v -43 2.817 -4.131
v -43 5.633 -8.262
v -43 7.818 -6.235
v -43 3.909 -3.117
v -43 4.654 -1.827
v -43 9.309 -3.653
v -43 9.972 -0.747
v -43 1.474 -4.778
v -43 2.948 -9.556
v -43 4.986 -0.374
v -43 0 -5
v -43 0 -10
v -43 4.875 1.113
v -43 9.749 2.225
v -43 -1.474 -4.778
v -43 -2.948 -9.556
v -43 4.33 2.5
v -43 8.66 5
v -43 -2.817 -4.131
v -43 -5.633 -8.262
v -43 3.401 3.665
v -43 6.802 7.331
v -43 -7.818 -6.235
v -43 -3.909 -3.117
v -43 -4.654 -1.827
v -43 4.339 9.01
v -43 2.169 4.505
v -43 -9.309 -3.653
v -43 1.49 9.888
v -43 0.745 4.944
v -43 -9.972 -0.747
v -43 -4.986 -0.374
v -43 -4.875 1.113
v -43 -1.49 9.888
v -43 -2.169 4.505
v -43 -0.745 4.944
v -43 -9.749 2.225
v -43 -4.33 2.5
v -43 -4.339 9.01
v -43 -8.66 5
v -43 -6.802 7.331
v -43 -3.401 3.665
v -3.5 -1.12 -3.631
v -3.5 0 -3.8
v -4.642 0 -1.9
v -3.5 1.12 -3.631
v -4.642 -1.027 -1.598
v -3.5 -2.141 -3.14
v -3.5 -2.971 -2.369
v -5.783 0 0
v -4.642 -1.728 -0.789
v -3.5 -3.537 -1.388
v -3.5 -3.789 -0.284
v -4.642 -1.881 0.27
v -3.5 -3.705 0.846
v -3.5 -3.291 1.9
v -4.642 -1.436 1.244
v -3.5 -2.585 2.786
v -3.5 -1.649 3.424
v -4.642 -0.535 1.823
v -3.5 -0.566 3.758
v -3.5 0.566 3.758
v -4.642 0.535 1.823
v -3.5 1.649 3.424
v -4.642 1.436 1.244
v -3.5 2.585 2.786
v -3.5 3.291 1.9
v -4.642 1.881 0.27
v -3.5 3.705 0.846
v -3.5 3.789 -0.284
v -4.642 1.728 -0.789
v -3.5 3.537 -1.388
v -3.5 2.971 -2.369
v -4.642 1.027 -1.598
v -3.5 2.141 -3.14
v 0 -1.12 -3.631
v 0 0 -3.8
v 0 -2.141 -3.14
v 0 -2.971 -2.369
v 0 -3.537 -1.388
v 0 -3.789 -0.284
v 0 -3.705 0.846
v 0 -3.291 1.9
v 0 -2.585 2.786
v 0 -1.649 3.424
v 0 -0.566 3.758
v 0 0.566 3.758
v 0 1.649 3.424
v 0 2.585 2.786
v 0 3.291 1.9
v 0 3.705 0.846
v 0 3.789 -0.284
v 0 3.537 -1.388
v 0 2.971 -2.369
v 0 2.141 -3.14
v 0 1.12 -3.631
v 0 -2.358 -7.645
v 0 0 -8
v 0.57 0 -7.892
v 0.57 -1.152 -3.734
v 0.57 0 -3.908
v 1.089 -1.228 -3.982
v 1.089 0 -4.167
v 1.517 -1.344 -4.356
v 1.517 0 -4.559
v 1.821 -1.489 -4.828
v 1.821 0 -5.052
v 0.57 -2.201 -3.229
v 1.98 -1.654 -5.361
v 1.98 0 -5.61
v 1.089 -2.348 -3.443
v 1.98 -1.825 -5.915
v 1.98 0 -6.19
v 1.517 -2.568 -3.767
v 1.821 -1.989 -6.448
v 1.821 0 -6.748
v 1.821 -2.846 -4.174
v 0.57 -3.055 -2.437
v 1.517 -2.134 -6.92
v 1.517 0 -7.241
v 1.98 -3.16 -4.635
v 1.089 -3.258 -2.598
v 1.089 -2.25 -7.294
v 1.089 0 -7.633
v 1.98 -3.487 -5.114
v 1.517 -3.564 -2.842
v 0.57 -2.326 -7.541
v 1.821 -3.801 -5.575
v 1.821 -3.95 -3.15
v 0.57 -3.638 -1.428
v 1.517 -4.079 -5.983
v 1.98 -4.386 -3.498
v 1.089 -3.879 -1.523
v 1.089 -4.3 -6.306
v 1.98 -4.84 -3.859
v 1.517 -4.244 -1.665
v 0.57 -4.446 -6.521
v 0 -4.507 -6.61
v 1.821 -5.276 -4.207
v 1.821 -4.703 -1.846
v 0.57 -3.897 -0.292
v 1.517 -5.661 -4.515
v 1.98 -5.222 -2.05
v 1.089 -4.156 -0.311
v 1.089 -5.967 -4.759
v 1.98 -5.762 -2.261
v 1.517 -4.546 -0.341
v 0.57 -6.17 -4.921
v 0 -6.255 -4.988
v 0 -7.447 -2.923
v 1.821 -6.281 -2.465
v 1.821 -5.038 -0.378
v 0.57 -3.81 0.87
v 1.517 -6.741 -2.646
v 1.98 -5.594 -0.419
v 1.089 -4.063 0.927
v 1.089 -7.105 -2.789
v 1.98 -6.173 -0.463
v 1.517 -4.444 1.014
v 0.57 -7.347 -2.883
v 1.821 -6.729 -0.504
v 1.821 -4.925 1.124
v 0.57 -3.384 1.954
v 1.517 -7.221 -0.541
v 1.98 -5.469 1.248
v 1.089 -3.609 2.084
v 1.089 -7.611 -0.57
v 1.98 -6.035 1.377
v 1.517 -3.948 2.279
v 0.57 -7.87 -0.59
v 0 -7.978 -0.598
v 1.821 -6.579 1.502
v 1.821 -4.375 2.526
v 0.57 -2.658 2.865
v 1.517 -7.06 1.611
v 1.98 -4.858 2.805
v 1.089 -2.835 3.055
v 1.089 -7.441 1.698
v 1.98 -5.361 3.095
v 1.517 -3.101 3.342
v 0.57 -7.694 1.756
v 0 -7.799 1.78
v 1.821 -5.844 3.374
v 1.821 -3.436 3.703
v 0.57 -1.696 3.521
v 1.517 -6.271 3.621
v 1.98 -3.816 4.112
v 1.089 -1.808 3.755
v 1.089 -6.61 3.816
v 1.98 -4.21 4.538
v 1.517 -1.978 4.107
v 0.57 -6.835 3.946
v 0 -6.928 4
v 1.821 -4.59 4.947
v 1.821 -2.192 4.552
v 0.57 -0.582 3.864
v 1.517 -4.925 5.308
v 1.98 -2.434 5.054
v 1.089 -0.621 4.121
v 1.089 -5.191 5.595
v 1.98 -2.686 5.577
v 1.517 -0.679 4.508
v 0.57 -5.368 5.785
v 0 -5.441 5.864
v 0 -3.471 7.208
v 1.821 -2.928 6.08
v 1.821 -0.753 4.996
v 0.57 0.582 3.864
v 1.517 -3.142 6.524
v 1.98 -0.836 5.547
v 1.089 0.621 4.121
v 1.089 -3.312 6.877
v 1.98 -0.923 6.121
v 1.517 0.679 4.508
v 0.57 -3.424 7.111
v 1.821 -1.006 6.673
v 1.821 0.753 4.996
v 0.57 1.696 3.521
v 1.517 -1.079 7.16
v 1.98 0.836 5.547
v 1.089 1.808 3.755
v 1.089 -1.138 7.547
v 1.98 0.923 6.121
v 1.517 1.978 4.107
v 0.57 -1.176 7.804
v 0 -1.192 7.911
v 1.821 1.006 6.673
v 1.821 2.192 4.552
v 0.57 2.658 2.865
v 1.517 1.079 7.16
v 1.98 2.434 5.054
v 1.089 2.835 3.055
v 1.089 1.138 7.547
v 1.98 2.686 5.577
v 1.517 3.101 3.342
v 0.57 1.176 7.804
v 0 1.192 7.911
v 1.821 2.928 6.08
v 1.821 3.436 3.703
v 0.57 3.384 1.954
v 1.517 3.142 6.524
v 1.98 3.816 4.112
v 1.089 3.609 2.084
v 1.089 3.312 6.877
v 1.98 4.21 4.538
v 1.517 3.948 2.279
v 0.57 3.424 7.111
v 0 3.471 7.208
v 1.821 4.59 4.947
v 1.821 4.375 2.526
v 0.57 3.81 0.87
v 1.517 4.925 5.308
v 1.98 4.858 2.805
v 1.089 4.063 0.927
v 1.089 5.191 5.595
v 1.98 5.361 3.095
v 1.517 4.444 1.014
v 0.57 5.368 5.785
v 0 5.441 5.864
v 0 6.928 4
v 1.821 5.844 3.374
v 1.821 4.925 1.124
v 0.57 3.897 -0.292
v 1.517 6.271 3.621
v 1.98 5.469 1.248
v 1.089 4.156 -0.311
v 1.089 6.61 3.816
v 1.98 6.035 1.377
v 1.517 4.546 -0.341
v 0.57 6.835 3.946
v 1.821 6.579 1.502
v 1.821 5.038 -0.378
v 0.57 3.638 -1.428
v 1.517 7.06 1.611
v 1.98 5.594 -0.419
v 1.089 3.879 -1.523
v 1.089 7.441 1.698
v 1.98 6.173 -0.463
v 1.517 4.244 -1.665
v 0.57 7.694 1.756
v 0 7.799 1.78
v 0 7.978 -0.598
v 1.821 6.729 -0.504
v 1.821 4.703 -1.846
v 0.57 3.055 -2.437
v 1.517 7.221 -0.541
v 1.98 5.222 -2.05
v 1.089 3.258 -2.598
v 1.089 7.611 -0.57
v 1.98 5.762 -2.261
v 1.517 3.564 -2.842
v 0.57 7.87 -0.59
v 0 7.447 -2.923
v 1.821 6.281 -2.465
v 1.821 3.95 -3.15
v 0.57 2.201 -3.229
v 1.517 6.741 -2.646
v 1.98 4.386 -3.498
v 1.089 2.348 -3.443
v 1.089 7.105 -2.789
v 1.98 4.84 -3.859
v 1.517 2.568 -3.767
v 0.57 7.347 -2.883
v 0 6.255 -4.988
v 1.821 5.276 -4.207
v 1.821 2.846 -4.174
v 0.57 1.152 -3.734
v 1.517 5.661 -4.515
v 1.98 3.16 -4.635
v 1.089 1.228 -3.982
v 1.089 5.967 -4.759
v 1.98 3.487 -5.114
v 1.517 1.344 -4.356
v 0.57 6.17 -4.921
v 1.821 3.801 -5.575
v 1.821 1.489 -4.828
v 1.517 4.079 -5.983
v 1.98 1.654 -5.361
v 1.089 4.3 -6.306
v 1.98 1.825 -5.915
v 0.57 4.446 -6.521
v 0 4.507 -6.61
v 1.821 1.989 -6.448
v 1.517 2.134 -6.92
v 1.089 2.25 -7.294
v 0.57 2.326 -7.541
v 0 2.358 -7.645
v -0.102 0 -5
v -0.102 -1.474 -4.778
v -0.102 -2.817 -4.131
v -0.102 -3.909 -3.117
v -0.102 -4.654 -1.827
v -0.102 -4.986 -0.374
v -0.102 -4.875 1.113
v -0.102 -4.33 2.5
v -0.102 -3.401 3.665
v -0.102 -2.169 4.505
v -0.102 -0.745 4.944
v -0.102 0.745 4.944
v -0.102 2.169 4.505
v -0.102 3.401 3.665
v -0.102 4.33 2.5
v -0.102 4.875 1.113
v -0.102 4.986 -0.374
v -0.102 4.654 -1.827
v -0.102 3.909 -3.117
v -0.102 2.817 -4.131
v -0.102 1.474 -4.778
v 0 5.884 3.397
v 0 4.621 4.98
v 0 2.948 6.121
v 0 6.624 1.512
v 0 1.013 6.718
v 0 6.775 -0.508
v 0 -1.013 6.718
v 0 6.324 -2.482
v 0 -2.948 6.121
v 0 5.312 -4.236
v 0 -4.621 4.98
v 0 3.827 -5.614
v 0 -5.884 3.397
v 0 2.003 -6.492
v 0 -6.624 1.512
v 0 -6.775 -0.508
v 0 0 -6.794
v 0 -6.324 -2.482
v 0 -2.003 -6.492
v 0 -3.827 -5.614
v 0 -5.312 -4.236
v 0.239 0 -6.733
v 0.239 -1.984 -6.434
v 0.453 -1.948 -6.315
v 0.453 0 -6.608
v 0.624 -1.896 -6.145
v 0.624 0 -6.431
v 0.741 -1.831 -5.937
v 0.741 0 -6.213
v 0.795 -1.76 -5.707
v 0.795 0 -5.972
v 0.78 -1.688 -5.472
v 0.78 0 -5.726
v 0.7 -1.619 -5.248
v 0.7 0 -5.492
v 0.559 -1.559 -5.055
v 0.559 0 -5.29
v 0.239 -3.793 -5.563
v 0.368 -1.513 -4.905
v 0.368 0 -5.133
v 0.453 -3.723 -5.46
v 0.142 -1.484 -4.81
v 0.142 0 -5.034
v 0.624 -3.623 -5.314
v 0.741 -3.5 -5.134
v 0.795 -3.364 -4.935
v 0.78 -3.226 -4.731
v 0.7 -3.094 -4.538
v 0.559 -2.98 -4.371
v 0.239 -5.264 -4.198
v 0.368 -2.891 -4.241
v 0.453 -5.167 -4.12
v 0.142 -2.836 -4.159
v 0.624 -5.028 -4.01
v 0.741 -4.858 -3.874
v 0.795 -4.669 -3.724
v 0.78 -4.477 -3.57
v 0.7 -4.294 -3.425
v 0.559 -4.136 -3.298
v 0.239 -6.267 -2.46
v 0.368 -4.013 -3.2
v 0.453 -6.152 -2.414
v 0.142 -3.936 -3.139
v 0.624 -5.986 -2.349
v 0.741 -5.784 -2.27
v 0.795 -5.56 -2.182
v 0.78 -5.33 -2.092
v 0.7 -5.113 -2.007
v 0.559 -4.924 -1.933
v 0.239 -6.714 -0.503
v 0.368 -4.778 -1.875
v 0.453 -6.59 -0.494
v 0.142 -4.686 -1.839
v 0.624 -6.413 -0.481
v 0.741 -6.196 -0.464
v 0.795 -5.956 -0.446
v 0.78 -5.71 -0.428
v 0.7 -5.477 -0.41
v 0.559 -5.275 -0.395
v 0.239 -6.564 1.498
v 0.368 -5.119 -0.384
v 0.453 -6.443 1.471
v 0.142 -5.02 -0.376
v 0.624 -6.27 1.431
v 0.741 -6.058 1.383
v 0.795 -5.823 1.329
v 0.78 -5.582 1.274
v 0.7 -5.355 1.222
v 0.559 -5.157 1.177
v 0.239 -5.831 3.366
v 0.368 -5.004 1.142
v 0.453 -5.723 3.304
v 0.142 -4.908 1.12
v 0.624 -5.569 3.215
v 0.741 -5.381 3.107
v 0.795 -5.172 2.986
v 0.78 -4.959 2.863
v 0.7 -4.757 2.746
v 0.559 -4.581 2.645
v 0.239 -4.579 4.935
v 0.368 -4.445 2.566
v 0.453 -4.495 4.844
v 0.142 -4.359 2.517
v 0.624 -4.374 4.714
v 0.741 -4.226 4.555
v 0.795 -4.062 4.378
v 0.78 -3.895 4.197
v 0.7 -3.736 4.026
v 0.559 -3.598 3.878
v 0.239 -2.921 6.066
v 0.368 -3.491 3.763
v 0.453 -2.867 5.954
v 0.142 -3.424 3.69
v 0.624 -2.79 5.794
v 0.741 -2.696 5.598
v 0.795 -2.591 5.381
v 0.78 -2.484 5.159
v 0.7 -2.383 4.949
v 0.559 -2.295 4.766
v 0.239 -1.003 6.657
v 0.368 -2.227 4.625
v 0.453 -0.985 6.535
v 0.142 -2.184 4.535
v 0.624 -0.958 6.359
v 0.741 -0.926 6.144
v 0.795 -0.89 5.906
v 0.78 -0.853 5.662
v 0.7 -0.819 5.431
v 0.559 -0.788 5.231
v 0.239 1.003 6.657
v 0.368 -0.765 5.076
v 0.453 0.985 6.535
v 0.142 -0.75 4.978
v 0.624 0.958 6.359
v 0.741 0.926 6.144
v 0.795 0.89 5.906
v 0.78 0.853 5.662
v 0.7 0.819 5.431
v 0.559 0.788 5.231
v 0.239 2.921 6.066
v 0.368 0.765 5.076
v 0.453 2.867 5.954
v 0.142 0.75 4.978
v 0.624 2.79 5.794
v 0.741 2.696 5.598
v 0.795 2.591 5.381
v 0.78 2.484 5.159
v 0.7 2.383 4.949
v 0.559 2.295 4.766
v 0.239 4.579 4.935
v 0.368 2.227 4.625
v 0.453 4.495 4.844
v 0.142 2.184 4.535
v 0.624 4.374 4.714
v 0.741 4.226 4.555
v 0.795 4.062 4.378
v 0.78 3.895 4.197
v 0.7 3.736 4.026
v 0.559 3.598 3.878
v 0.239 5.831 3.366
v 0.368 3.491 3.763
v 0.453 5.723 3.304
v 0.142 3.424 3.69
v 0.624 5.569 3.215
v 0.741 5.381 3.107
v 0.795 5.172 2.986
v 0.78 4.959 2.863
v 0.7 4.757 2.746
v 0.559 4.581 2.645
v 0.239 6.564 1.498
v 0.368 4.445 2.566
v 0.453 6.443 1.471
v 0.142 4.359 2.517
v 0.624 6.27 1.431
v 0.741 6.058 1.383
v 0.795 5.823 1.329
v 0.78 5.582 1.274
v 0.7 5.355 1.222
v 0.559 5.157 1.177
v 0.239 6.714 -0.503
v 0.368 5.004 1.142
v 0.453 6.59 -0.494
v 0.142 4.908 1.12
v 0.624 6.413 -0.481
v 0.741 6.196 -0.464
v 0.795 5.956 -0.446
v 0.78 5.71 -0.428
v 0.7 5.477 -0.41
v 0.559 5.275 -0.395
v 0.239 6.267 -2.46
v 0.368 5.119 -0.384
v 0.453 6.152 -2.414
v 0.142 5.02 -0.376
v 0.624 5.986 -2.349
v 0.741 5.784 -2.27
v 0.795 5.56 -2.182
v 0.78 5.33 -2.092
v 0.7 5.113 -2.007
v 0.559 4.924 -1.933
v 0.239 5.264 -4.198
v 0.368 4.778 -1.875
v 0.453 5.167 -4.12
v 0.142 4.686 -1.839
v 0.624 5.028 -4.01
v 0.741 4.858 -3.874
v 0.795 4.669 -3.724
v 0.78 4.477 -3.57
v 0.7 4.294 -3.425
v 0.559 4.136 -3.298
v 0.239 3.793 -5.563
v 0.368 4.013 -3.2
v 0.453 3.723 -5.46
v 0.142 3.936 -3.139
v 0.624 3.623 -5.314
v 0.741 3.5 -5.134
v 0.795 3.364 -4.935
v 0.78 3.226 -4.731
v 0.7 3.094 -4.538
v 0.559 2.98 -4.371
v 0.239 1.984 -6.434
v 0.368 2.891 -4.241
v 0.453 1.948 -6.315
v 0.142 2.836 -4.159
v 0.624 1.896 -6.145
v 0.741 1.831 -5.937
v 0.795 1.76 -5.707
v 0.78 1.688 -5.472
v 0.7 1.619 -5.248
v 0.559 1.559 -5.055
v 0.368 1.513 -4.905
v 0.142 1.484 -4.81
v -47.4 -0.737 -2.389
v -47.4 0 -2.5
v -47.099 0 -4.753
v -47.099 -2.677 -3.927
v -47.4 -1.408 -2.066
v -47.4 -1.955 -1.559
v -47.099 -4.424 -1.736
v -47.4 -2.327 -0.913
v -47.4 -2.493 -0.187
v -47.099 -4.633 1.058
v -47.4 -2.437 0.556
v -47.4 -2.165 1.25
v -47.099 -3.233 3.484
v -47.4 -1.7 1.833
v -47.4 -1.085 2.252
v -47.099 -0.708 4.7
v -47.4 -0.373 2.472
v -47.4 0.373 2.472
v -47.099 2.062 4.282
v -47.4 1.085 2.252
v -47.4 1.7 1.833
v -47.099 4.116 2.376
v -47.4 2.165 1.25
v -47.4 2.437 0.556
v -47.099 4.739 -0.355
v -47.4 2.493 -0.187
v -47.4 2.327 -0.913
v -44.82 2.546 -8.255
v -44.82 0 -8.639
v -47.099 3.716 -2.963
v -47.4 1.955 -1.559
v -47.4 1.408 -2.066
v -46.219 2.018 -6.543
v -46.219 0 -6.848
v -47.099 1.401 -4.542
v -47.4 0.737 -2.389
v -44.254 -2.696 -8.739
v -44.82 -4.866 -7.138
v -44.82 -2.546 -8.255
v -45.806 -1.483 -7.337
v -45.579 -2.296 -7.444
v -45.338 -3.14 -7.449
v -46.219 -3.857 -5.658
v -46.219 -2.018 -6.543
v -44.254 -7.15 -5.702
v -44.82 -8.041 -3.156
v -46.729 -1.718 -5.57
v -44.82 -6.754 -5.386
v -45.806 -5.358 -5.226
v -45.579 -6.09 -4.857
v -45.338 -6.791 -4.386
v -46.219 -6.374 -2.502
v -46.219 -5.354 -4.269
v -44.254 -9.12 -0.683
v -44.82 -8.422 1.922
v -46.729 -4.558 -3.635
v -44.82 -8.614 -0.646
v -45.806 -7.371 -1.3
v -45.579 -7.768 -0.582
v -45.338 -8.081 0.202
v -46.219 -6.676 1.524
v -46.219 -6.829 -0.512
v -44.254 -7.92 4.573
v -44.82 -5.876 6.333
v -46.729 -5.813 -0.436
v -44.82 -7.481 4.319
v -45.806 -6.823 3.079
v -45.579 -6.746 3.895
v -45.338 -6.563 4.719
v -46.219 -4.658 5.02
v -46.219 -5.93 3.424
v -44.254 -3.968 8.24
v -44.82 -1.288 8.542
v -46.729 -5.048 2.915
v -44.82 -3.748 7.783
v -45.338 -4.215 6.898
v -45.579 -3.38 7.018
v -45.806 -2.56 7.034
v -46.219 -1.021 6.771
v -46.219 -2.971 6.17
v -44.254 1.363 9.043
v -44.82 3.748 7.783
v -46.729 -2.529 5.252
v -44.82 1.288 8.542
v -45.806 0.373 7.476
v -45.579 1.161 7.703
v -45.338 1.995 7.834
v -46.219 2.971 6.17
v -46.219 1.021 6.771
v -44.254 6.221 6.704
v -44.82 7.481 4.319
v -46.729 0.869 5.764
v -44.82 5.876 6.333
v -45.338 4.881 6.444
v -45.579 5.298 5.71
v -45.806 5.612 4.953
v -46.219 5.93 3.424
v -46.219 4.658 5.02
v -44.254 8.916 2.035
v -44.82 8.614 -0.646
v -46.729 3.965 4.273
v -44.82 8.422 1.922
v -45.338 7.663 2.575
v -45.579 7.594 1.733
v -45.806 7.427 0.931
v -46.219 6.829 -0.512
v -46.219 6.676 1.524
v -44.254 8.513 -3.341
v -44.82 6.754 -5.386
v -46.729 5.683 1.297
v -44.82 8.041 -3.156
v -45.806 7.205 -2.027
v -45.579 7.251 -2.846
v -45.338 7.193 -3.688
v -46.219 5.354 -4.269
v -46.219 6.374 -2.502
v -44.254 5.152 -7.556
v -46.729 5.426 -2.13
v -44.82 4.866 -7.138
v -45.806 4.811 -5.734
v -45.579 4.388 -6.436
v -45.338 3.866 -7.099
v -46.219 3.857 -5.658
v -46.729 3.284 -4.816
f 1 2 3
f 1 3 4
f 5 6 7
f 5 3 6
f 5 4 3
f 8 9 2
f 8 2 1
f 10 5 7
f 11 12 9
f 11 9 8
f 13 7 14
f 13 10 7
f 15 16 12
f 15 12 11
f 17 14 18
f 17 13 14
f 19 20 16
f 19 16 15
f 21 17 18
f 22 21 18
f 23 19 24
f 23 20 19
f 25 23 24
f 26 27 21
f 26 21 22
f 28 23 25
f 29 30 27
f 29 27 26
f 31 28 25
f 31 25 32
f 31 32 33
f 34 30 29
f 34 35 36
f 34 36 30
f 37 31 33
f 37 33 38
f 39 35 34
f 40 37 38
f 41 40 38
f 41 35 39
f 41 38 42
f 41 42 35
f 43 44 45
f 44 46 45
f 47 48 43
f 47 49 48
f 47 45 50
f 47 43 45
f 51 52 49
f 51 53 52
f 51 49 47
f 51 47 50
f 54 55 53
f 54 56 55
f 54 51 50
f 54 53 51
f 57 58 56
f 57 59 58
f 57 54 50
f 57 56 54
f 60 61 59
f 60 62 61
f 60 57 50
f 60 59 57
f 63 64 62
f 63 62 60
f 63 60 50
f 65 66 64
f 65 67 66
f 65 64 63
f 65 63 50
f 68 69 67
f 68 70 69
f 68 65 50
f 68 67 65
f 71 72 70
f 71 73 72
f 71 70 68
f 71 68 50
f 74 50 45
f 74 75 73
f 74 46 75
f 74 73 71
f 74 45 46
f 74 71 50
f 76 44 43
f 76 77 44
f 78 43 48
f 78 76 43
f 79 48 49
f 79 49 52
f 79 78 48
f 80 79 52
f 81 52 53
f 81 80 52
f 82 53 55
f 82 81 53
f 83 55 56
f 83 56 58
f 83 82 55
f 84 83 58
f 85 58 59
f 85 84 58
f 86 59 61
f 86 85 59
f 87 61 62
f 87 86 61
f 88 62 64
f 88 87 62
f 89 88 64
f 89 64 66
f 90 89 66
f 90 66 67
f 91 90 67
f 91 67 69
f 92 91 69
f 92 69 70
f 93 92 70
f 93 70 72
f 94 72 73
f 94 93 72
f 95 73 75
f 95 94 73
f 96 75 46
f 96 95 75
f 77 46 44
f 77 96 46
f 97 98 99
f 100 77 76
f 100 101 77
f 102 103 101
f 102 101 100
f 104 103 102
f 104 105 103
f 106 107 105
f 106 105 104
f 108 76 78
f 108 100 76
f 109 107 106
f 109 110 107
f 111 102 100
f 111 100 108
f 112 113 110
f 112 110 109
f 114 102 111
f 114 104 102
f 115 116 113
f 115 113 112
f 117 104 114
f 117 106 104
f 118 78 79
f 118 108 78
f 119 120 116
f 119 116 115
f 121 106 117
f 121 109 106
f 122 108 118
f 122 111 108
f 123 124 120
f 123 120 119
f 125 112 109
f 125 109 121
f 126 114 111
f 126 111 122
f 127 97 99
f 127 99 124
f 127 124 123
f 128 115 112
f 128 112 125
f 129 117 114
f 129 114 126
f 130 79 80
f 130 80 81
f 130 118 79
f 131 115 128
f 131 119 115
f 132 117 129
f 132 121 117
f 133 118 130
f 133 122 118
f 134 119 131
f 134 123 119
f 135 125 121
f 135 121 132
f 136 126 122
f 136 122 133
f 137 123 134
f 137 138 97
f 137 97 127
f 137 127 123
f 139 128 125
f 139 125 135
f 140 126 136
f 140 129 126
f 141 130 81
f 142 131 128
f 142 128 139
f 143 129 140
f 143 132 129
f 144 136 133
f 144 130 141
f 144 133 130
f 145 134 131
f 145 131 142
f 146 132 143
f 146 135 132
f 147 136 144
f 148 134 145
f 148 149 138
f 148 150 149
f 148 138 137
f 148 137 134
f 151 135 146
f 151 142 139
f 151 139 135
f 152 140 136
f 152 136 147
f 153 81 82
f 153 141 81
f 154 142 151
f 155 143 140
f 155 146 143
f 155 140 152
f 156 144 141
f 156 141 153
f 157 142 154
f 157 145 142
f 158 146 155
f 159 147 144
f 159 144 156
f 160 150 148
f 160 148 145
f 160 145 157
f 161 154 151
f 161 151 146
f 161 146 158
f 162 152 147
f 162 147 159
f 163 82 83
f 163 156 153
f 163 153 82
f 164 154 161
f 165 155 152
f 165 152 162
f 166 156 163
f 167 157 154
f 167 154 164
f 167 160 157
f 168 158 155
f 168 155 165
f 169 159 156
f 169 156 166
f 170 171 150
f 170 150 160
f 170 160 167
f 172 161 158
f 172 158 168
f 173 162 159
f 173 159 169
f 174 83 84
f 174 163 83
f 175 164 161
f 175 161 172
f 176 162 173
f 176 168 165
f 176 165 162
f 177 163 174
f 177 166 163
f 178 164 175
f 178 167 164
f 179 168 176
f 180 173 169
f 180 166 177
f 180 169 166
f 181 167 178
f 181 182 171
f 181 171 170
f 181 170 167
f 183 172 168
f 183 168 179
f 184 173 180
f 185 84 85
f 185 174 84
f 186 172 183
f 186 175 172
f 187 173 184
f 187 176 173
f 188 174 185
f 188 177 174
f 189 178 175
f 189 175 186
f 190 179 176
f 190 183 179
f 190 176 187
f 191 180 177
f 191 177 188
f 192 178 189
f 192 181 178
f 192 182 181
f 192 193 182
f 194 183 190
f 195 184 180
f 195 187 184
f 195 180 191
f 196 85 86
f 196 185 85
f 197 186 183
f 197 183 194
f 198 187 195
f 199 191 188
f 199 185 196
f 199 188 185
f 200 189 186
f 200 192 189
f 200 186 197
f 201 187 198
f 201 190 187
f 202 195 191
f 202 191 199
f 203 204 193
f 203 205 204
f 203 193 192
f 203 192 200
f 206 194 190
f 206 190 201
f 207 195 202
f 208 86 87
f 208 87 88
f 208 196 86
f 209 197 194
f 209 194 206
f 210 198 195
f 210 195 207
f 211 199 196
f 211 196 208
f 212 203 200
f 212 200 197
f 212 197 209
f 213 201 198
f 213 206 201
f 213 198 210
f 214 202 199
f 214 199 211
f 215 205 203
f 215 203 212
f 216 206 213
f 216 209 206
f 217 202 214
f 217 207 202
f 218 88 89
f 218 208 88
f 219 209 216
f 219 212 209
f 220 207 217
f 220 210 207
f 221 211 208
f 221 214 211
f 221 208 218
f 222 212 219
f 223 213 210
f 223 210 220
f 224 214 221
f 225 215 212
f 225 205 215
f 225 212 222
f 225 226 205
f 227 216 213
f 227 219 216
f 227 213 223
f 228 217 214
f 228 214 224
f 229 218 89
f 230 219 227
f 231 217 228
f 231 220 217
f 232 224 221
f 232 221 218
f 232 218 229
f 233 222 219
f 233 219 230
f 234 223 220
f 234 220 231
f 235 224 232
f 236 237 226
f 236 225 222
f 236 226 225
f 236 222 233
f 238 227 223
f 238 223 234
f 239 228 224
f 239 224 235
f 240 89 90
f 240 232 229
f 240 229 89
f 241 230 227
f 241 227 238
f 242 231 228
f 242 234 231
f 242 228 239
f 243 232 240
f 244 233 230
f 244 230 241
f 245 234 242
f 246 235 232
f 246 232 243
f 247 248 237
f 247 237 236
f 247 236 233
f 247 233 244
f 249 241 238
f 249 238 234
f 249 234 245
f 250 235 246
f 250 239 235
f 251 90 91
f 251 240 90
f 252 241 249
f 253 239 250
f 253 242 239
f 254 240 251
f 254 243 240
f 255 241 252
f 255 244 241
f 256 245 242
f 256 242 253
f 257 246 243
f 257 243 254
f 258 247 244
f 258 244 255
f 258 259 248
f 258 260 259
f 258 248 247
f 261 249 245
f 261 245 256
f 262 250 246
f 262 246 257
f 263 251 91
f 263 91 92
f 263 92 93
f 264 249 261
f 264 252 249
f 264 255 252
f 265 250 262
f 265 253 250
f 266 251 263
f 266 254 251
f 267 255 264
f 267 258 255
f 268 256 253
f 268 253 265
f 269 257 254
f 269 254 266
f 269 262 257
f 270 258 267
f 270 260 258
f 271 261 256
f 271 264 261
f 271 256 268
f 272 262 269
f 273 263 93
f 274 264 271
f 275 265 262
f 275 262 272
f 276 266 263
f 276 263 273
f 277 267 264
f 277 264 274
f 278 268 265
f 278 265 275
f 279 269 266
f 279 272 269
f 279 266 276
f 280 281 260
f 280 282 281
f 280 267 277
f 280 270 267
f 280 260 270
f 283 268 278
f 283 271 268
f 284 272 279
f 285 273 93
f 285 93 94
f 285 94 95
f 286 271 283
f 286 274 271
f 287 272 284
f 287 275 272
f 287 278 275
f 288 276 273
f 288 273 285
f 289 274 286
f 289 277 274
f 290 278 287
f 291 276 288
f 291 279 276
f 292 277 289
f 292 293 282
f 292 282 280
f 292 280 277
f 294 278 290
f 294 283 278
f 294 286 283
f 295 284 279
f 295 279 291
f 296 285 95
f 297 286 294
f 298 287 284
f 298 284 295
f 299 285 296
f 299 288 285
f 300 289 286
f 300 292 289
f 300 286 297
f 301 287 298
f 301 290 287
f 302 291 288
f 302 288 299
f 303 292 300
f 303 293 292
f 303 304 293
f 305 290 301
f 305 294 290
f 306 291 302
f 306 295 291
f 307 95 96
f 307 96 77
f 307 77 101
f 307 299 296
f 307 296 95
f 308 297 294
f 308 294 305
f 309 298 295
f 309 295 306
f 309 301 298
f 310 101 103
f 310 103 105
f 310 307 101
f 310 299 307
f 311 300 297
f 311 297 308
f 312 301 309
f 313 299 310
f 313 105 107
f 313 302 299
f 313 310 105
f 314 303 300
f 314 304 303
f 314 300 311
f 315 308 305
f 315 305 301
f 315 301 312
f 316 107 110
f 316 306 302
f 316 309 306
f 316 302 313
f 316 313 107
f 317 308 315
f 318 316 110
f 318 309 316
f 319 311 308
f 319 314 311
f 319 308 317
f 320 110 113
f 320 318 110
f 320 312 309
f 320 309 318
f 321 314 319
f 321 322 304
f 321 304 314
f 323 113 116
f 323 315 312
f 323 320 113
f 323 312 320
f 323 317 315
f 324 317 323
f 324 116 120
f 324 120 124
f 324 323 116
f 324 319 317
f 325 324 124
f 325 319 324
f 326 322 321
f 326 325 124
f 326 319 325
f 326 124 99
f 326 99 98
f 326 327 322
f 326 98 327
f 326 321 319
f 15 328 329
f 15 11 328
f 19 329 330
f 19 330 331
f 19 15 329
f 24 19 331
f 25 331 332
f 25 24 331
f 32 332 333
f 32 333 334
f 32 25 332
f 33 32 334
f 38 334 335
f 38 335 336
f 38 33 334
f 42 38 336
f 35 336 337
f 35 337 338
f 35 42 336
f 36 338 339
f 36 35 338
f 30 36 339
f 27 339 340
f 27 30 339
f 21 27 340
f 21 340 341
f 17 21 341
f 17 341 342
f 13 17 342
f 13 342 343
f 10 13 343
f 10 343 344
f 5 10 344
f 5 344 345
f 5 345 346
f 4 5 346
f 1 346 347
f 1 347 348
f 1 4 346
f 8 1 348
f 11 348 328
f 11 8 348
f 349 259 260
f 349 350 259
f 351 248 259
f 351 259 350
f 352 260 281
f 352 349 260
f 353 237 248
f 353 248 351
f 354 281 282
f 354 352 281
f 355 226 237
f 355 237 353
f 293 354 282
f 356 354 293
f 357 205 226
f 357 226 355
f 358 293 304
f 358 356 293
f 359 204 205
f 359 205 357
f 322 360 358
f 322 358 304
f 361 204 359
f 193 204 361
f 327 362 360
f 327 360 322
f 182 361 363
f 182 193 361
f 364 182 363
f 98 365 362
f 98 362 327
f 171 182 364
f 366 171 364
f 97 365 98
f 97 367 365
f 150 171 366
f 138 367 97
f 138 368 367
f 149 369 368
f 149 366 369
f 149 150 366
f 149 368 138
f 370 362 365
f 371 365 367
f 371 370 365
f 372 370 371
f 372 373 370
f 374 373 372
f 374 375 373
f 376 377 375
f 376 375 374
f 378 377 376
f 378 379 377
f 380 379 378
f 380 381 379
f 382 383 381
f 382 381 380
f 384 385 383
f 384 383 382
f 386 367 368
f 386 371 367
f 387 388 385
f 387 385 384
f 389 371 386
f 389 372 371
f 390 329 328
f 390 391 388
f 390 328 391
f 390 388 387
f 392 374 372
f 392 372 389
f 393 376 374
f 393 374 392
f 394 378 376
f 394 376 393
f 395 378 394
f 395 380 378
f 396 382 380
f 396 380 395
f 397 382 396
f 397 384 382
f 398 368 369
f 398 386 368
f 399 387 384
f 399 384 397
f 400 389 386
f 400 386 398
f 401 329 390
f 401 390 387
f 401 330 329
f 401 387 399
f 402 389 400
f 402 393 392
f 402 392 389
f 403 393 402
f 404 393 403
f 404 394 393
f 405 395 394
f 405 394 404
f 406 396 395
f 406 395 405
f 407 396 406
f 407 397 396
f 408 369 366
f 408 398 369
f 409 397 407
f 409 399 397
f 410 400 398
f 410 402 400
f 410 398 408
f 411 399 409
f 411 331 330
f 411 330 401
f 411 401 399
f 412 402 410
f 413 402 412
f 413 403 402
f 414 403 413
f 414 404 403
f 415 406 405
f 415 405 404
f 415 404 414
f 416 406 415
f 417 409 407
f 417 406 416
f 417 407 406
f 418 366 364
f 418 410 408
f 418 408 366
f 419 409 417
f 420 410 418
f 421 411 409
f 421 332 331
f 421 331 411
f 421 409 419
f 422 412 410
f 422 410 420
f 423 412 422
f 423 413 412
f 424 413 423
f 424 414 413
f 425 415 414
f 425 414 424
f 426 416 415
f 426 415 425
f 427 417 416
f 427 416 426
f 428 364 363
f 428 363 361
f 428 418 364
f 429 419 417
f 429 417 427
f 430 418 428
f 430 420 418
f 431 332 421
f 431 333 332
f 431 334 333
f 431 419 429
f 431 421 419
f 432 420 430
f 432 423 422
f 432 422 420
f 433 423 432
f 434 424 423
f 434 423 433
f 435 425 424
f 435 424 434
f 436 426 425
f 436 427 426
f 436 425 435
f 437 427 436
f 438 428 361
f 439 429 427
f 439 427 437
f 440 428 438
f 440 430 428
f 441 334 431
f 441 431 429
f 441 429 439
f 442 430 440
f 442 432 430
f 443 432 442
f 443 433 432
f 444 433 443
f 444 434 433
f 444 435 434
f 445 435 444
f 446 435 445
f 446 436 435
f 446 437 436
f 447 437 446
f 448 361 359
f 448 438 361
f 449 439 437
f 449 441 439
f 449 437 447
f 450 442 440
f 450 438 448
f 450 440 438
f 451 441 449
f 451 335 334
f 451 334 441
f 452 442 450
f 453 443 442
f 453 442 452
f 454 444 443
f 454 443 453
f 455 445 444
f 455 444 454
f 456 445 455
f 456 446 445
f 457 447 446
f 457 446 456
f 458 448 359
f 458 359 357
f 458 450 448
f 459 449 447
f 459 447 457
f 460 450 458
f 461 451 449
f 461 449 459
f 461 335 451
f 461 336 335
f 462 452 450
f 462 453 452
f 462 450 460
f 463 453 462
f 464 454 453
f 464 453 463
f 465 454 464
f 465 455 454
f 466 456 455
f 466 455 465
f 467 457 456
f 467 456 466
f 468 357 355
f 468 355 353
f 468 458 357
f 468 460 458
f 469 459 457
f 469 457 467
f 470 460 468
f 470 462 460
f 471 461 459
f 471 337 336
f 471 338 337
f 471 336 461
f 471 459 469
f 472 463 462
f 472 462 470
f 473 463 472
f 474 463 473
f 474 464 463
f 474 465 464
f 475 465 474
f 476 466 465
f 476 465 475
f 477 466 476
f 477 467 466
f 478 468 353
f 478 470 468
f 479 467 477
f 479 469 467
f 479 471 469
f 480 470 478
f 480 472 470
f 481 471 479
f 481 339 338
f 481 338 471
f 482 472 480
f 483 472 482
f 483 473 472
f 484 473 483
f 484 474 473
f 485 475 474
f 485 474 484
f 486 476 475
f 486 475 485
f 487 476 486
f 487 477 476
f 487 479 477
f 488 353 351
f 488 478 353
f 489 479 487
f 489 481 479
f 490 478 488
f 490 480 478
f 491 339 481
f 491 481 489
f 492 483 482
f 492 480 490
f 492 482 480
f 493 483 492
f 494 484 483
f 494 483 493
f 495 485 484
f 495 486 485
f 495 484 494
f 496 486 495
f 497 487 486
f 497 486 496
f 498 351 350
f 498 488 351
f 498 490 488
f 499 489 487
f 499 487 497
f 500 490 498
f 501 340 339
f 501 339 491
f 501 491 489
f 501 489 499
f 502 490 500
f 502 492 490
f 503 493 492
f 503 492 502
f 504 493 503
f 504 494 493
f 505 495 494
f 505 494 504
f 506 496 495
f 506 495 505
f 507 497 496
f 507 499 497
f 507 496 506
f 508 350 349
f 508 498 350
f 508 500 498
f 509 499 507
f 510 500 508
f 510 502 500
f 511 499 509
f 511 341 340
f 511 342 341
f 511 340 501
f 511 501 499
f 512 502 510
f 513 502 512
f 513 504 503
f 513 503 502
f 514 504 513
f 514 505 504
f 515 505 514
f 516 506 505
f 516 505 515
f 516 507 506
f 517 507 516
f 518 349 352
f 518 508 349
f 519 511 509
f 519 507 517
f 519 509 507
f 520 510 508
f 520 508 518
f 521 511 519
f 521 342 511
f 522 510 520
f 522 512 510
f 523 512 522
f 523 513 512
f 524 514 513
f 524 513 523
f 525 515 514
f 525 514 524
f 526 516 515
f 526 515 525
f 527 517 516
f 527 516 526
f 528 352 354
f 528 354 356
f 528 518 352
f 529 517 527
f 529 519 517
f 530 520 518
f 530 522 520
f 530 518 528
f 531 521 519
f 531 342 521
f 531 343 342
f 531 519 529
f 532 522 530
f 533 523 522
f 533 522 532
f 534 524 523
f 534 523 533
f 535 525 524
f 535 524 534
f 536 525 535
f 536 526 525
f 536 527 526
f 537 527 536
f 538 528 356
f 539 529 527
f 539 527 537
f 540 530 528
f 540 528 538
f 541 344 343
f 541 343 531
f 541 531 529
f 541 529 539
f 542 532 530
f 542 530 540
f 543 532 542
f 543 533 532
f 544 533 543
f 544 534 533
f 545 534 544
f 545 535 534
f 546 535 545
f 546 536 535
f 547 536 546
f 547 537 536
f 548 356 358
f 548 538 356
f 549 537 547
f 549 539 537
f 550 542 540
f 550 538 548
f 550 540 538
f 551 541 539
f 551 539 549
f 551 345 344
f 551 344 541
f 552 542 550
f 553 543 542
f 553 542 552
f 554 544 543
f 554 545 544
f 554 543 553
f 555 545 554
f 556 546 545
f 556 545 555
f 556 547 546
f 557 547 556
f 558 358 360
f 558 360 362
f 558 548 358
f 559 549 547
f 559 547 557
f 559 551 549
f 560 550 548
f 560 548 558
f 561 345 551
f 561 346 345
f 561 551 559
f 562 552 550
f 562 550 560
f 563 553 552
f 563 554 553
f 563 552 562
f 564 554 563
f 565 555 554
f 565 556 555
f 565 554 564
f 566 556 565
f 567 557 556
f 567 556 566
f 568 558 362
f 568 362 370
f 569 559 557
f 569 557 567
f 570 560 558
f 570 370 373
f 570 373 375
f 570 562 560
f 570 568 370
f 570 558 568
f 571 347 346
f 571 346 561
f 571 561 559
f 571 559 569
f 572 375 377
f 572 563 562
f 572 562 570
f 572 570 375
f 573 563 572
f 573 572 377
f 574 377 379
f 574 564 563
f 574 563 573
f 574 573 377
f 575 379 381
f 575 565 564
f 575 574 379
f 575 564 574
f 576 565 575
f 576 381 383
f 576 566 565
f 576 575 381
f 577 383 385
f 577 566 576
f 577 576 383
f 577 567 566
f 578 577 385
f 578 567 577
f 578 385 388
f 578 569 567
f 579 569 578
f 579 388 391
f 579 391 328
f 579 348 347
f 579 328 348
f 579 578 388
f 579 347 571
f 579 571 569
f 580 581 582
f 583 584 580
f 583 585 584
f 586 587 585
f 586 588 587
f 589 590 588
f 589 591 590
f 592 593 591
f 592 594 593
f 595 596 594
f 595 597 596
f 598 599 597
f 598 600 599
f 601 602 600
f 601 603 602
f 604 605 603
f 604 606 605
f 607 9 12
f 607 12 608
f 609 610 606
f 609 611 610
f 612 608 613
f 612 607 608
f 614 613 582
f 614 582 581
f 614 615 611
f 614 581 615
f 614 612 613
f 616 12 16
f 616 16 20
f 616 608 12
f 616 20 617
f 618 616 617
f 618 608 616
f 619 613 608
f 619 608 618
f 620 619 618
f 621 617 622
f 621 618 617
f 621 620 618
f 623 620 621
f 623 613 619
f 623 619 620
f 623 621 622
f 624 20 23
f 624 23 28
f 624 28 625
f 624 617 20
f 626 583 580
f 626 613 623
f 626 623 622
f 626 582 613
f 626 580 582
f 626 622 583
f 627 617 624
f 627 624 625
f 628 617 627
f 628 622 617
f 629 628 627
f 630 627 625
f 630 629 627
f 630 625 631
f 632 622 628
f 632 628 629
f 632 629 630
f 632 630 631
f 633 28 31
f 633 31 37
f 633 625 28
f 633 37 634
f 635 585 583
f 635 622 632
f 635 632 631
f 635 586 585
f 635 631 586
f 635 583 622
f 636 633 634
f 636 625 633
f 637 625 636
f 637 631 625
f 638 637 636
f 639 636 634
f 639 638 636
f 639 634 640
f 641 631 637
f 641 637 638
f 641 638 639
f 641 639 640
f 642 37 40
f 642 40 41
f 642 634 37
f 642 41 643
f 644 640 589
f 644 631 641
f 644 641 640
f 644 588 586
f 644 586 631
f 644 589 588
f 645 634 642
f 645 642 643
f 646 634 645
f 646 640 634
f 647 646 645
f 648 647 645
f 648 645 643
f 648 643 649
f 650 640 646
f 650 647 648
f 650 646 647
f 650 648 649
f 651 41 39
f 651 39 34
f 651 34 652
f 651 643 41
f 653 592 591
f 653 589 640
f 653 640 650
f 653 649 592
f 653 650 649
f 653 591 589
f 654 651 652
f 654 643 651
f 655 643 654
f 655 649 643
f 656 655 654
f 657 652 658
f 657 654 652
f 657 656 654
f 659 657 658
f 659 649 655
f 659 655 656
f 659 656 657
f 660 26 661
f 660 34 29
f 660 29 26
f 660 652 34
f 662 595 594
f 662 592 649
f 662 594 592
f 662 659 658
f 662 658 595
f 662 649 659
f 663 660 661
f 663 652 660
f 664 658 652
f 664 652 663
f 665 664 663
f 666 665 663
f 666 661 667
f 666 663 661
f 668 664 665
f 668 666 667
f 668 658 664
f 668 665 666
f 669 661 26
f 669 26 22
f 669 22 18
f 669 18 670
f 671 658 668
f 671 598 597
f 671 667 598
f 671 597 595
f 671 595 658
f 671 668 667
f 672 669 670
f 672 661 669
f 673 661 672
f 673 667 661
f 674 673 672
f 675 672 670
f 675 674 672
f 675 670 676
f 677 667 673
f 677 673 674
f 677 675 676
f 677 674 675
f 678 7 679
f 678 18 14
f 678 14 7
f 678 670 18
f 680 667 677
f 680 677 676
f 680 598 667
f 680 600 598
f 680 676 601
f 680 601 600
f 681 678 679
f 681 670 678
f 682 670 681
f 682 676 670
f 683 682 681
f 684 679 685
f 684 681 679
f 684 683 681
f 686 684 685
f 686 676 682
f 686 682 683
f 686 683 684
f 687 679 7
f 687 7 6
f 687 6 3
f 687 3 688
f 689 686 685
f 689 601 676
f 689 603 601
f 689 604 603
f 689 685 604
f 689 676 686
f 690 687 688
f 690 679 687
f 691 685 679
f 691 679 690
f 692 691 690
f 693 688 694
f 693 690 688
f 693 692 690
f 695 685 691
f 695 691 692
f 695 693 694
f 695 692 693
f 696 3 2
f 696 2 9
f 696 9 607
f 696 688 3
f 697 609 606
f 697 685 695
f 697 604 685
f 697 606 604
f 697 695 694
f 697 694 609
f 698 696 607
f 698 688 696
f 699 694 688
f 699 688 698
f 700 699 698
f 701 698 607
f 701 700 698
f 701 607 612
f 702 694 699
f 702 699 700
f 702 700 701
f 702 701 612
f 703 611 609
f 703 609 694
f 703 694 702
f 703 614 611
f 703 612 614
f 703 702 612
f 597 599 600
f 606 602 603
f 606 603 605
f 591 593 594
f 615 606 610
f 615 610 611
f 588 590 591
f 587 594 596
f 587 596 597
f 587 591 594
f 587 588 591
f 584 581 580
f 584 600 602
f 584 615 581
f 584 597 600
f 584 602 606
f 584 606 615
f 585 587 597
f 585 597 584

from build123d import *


with BuildPart() as part:
    # Sketch1 → Base-Revolve (revolve)
    with BuildSketch(Plane.XY, mode=Mode.PRIVATE) as base_revolve_sk:
        with BuildLine():
            Line((0, 8), (0, 6.794144144))
            ThreePointArc((0, 6.794144144), (0.796034843, 5.848666431), (-0.1025, 5))
            Line((-0.1025, 5), (-43, 5))
            Line((-43, 5), (-43, 10))
            ThreePointArc((-43, 10), (-46.218807741, 6.847700542), (-47.4, 2.5))
            Line((-47.4, 2.5), (-47.4, 0))
            Line((-47.4, 0), (-5.783270352, 0))
            Line((-5.783270352, 0), (-3.5, 3.8))
            Line((-3.5, 3.8), (0, 3.8))
            ThreePointArc((0, 3.8), (2, 5.9), (0, 8))
        make_face()
    revolve(base_revolve_sk.sketch.rotate(Axis((40.376928104, 0, 0), (-1, 0, 0)), 90), axis=Axis((40.376928104, 0, 0), (-1, 0, 0)))


solid = part.part
